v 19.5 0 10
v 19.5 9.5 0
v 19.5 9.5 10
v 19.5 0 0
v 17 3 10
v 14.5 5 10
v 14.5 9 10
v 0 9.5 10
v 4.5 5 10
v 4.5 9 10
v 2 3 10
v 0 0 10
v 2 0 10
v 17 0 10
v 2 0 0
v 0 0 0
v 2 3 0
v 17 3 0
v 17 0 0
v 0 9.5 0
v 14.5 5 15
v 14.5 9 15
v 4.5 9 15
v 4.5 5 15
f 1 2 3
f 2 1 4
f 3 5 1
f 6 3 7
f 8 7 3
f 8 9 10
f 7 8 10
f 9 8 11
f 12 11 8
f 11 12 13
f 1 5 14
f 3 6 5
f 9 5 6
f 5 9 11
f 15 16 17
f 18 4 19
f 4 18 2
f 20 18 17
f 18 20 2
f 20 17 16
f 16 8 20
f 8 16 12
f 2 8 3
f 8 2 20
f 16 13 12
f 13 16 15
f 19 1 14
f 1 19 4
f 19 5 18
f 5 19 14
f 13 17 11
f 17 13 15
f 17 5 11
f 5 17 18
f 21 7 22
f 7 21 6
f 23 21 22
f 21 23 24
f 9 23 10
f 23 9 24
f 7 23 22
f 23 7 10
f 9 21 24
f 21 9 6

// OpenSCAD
difference()
{
  cube([19.5,9.5,10]);
  translate([2,-1,-1]) cube([15,4,12]);
}
translate([4.5,5,10]) cube([10,4,5]);
